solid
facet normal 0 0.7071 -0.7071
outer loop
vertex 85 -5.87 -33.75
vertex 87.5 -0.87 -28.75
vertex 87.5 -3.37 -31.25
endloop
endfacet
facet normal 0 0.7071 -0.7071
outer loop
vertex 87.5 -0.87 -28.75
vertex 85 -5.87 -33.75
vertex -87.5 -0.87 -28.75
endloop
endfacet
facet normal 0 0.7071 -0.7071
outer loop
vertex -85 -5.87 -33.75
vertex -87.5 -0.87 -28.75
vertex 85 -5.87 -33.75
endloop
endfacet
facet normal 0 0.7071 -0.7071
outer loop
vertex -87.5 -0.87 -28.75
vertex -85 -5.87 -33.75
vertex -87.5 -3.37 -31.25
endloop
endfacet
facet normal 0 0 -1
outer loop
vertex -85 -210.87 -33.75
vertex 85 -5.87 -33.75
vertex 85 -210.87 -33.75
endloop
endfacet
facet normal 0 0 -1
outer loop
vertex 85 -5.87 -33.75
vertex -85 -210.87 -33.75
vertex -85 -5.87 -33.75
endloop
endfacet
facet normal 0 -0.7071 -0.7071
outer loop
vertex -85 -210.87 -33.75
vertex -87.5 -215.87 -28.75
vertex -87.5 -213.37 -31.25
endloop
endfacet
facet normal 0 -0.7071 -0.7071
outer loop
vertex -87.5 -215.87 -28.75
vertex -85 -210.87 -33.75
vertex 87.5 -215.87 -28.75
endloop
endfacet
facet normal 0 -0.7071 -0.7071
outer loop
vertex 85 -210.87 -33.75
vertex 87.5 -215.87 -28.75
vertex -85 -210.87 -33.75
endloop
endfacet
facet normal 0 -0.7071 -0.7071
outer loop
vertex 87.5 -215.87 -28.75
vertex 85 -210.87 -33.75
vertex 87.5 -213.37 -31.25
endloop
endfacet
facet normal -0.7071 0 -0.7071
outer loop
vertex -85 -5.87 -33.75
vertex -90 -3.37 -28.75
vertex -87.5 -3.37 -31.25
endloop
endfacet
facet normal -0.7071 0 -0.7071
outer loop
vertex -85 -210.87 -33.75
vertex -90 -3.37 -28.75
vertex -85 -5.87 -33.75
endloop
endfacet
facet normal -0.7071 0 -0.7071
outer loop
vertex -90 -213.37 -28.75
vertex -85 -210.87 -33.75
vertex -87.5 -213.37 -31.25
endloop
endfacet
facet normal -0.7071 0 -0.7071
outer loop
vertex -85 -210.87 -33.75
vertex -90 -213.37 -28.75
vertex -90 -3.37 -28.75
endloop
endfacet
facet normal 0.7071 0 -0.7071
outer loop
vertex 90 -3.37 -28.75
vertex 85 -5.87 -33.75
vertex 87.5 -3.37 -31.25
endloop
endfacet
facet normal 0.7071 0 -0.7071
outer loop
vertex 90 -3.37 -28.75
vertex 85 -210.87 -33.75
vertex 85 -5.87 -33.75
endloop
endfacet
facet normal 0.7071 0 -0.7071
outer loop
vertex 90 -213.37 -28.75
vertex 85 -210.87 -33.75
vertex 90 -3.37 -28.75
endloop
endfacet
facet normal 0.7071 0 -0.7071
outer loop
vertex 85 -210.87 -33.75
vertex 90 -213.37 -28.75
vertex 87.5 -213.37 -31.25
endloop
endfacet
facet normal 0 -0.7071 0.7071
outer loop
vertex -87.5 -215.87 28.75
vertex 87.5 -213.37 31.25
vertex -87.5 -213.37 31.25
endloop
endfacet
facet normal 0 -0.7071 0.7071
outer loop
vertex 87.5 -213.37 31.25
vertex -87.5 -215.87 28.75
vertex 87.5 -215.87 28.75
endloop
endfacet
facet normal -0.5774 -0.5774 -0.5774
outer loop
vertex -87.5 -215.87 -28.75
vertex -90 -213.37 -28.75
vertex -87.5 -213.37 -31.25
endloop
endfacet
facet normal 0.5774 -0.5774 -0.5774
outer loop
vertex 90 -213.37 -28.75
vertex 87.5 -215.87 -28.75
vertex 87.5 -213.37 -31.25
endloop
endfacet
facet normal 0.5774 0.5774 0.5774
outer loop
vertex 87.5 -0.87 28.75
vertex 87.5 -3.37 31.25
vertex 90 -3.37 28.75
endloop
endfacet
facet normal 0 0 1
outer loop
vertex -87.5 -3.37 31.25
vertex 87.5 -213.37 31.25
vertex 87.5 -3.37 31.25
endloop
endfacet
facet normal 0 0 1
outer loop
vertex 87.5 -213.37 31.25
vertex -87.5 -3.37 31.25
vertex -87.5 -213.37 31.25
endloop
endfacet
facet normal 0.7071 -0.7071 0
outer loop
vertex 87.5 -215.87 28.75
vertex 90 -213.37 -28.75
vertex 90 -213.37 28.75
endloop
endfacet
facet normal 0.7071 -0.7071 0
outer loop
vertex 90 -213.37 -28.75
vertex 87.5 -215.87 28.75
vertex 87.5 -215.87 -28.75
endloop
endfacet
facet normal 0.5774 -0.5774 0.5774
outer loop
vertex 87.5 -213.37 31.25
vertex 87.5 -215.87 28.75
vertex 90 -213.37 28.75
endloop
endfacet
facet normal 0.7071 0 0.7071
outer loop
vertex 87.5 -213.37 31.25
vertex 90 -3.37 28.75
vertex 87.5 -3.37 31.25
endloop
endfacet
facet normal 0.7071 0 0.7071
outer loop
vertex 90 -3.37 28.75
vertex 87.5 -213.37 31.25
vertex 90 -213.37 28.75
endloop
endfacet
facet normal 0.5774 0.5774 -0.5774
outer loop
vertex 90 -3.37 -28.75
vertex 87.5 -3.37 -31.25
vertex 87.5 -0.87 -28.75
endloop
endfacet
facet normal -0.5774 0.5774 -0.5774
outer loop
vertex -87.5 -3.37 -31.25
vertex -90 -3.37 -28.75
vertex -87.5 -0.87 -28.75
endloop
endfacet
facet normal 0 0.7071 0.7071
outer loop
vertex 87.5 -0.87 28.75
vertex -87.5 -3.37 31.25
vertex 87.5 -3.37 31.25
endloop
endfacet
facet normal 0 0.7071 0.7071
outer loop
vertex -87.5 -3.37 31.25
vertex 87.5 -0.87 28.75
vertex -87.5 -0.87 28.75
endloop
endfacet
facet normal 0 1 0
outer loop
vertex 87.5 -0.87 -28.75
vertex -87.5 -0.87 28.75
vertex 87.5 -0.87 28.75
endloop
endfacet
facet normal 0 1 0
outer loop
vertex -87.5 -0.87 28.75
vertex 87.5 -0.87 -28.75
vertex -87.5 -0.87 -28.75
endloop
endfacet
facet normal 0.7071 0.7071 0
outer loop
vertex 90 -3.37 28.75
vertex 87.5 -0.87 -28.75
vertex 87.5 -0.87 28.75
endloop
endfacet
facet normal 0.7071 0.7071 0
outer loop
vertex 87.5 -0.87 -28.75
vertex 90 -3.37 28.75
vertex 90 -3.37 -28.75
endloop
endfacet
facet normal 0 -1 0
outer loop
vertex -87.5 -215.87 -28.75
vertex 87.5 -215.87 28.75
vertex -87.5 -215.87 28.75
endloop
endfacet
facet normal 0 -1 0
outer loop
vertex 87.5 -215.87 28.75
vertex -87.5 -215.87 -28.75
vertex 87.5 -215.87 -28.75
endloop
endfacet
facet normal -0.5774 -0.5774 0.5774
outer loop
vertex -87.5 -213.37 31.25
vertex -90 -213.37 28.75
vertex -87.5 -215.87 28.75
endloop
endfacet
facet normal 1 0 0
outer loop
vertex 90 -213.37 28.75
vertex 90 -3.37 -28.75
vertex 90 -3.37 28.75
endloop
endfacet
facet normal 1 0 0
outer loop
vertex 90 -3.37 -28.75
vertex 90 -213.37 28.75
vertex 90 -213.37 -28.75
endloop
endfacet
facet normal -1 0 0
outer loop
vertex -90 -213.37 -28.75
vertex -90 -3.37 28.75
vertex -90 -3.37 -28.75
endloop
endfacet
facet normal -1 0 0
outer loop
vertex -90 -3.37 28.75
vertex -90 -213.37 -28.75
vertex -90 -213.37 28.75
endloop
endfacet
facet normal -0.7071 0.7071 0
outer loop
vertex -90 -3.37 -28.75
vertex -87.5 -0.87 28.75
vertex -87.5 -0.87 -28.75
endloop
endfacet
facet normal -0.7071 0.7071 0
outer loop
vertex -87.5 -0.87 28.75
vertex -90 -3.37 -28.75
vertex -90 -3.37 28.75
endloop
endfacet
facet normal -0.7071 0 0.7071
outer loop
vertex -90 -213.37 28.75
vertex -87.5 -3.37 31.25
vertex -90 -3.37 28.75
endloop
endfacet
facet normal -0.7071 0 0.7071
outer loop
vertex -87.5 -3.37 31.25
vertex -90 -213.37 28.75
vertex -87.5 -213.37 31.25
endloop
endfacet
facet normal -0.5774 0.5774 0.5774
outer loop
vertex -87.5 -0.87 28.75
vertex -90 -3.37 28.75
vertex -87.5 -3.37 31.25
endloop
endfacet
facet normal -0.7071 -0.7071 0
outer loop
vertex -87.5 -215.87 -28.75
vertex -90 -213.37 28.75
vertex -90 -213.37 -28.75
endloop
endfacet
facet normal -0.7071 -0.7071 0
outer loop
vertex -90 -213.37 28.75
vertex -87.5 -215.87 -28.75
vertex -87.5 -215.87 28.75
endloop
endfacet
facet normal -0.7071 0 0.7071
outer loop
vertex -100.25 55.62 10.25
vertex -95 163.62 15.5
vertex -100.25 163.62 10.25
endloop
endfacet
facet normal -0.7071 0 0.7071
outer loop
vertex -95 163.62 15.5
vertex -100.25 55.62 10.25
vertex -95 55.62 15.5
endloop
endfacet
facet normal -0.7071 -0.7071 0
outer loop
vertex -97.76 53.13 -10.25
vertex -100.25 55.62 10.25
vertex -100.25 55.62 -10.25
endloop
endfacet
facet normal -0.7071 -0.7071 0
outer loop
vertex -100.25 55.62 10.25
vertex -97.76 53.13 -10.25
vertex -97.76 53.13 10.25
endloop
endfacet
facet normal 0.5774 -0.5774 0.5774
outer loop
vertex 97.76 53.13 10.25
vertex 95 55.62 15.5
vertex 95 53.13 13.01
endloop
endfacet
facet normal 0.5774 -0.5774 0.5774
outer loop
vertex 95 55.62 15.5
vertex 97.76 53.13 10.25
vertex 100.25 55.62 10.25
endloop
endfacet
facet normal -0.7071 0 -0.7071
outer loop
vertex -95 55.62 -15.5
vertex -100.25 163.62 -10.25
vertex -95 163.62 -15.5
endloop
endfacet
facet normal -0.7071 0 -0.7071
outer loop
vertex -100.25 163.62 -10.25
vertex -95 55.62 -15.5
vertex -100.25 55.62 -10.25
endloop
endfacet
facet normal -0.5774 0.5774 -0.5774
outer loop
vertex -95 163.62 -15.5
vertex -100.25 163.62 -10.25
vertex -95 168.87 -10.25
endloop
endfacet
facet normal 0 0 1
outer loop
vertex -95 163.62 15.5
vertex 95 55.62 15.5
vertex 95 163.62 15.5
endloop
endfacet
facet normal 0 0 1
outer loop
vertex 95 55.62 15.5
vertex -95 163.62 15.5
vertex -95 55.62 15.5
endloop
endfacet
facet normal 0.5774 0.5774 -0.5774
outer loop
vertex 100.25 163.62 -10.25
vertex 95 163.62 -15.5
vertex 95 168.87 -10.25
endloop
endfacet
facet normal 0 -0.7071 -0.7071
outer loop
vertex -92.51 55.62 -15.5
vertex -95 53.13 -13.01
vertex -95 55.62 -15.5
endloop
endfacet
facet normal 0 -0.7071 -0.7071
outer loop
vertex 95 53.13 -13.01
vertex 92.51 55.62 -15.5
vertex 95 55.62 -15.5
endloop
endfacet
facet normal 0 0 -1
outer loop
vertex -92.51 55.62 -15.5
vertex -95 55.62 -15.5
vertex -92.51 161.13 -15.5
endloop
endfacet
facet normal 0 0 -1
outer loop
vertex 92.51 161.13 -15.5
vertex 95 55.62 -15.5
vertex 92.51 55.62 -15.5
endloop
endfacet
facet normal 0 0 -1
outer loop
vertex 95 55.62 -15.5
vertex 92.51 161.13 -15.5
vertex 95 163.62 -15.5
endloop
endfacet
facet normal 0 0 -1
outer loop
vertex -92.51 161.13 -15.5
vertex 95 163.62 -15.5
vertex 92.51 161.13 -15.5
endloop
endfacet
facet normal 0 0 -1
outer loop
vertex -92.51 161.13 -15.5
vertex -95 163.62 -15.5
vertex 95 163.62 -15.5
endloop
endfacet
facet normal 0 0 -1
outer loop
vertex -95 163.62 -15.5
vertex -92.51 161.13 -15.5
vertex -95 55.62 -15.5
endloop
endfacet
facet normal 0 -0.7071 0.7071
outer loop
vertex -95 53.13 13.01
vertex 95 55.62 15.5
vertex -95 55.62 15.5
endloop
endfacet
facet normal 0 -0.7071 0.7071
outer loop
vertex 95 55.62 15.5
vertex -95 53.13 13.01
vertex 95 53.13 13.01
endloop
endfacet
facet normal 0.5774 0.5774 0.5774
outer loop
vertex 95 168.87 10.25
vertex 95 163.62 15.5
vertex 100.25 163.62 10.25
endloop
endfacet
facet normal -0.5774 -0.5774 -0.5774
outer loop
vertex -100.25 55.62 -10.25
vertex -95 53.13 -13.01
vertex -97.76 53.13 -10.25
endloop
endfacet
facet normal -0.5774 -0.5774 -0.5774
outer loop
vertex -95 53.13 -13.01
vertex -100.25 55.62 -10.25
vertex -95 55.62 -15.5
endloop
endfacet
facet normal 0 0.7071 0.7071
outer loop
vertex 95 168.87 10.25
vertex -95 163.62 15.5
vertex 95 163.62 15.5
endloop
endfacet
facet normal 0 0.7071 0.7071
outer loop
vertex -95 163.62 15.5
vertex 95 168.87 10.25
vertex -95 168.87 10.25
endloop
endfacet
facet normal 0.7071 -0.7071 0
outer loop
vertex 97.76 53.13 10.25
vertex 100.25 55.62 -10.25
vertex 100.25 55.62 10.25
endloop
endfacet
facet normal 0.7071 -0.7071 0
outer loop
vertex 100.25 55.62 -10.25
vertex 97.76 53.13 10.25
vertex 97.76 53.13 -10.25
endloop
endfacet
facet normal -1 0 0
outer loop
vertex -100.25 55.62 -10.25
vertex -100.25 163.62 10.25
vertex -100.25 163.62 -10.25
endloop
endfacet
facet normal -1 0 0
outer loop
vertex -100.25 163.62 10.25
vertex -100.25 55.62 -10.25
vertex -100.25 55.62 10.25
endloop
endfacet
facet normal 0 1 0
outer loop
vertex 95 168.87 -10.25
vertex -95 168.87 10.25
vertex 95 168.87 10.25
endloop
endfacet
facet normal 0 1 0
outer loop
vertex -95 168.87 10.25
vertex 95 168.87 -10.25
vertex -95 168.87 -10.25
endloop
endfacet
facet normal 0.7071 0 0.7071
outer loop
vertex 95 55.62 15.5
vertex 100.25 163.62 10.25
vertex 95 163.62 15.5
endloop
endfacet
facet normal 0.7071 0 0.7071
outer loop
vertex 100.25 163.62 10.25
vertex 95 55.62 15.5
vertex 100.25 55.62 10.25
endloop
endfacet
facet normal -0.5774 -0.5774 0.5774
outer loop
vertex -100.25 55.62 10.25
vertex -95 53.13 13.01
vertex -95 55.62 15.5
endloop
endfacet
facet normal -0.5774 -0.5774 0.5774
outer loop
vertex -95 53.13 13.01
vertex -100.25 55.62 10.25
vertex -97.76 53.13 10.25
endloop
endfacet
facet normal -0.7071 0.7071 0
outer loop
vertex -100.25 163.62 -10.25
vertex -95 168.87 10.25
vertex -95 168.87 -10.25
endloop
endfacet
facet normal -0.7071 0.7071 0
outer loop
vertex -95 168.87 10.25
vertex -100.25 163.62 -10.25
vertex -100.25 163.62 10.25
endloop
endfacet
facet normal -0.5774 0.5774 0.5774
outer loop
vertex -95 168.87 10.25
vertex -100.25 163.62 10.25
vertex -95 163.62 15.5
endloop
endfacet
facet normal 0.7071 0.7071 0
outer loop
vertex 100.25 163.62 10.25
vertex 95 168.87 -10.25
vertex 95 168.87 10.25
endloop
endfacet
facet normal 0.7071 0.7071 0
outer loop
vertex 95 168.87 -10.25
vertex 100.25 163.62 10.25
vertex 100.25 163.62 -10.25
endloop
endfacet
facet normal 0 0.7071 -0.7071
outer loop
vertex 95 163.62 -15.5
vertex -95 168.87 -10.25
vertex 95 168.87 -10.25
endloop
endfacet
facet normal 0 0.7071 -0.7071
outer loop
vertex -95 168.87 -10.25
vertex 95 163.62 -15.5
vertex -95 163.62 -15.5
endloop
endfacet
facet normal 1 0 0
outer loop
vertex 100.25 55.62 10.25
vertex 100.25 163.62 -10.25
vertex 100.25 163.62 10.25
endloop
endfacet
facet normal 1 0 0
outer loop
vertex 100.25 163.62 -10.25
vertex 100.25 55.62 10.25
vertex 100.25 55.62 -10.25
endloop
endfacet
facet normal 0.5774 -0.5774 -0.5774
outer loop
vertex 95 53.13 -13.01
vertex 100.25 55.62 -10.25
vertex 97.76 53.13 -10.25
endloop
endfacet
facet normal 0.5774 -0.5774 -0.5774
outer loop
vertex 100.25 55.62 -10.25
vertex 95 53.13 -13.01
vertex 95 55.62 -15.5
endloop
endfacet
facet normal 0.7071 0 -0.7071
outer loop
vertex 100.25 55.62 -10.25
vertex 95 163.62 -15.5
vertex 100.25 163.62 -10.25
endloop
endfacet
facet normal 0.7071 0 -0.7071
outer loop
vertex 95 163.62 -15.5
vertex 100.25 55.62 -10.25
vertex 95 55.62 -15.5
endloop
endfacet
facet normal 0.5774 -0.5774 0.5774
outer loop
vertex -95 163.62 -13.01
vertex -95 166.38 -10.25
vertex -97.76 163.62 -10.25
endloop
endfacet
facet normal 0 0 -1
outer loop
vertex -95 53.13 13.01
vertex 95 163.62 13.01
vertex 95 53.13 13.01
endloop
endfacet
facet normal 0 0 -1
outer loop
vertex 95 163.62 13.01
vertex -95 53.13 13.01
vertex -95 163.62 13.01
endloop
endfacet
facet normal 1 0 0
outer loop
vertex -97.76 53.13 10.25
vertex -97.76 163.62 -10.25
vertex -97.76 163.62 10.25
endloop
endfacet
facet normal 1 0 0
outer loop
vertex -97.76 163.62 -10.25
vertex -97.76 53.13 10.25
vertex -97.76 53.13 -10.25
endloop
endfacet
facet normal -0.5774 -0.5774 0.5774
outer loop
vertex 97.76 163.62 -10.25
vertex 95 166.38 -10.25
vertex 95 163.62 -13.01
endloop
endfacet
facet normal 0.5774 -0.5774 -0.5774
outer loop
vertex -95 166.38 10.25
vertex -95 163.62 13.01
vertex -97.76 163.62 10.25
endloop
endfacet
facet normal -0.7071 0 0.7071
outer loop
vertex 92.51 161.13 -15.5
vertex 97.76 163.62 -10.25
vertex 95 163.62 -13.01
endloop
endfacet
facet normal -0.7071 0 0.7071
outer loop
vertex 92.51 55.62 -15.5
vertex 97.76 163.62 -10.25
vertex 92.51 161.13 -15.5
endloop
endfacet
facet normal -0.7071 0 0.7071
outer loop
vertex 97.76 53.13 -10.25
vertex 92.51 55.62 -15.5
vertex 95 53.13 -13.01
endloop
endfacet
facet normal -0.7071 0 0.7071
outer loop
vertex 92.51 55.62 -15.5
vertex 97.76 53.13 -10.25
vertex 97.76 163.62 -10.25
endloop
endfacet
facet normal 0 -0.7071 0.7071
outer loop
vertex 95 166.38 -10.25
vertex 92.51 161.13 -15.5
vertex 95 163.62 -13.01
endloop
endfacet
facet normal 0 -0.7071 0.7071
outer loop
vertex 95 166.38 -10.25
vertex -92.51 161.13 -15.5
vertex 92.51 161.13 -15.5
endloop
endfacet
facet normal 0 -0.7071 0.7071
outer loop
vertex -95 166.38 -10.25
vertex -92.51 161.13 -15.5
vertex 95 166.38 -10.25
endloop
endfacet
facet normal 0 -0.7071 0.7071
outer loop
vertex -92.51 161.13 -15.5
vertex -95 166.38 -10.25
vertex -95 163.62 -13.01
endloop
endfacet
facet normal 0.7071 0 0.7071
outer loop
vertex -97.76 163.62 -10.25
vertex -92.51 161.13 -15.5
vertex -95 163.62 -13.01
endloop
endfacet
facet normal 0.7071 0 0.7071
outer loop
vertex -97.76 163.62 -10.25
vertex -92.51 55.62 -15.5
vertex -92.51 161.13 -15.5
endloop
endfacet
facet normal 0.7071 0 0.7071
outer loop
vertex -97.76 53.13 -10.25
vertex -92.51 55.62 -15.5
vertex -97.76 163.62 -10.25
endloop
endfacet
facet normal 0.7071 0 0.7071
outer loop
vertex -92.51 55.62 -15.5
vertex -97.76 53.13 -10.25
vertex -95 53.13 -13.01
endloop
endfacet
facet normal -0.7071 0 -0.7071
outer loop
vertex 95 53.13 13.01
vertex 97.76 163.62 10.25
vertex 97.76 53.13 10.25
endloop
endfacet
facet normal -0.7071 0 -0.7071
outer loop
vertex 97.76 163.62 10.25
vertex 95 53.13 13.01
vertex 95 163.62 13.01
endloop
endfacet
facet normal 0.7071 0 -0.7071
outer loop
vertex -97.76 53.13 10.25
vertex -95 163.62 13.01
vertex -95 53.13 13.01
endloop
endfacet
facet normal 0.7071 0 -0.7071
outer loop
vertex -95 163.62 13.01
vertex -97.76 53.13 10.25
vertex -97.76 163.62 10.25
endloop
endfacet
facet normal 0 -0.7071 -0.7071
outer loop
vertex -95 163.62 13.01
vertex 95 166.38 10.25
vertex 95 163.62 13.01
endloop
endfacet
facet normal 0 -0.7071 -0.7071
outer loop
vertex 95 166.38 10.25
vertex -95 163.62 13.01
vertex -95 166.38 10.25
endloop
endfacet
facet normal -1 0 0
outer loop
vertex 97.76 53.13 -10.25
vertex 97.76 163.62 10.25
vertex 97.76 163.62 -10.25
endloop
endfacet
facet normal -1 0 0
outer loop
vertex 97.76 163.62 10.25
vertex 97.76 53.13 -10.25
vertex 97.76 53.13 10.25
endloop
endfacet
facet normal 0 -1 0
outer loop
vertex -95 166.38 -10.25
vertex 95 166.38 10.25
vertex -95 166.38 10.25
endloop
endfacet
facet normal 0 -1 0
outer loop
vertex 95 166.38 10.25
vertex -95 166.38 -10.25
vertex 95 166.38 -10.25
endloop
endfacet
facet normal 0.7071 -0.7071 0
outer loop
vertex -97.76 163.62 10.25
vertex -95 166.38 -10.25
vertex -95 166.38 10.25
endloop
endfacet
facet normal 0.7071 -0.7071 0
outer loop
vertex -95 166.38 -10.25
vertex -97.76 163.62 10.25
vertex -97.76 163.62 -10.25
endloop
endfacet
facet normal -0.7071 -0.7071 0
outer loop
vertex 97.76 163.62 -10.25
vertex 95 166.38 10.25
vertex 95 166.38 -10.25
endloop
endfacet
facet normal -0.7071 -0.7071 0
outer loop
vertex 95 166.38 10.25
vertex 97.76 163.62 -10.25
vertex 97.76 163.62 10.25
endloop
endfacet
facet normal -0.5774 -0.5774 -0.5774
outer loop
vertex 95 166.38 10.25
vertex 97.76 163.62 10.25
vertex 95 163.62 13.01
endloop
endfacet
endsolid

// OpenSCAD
// file: sliding_chamfered_box.scad
/* Villano OpenSCAD 2021.1 */
Interior_Width=190; //[300]
Interior_Depth = 110; //[300]
Interior_Height=23; //[300]
Wall_Thickness=2.5; //[1:.5:30]
Clearance=.25; //[0:.05:1]

w=Interior_Width;
d=Interior_Depth;
h=Interior_Height;
twt=Wall_Thickness;
slop=Clearance;

module octahedron(r){
    scale(r) polyhedron(
        points=[
            [ 0,  0,  1],
            [ 1,  0,  0],
            [ 0,  1,  0],
            [-1,  0,  0],
            [ 0, -1,  0],
            [ 0,  0, -1],
        ],
        faces=[
            [0, 1, 2],
            [0, 2, 3],
            [0, 3, 4],
            [0, 4, 1],
            [5, 2, 1],
            [5, 3, 2],
            [5, 4, 3],
            [5, 1, 4],
        ]
    );
}

module drawer(w,d,h,solid=false) {
    difference(){
        union(){
            minkowski(){
                cube([w,d,h-twt],center=true);
                octahedron(twt);
            }
            translate([0,0,-twt]) intersection(){
                minkowski(){
                    cube([w-2*twt,d-2*twt,h-3*twt],center=true);
                    rotate([0,90,0])
                        cylinder(r=2*twt,h=2*twt,center=true,$fn=4);
                }
                minkowski(){
                    cube([w-2*twt,d-2*twt,h-3*twt],center=true);
                    rotate([90,0,0])
                        cylinder(r=2*twt,h=2*twt,center=true,$fn=4);
                }
            }
        }
        if (!solid) translate([0, 0, twt/2+.01])
            cube([w,d,h], center=true);
    }
}
module lid() translate([0,twt/2,0]) difference(){
    minkowski(){
        cube([w,d-twt+2*slop,h-twt], center=true);
        octahedron(2*twt+slop);
    }
    translate([0,-twt/2,0]) minkowski(){
        drawer(w,d+2*slop,h,solid=true);
        octahedron(slop+.01);
    }
}

translate([0,-d/2-twt,0]) drawer(w,d,h);
translate([0,d/2+twt,0]) lid();
// main file
/* Villano OpenSCAD 2021.1 */

use <sliding_chamfered_box.scad>

$fa = .01;
$fs = $preview ? 5 : 1;
//$fn=4;

Head=9;
Interior_Width=175; //[300]
Interior_Depth = 210; //[300]
Interior_Height=60; //[300]
Clearance=.2; //[0:.05:1]


Wall_Thickness=3.37;
w=Interior_Width;
d=Interior_Depth;
h=Interior_Height;
twt=Wall_Thickness;
slop=Clearance;

module carve(depth) minkowski(){
    children();
    rotate([180,0,0])
        cylinder(r=slop,h=depth);
}

module drawer2() difference(){
    
    drawer(w,d,h,twt);
    
    translate([0,0,-h/2+twt/2]) carve(4.5) {
        translate([0,152/2-4.5,0])
            rotate([0,90,0])
            cylinder(d=Head,h=(26.8-2)*2, center=true);//head
        rotate([90,0,0])
            cylinder(d=4,h=152,center=true);//stick
        cylinder(d=25,h=9,center=true); //thumb holes
    }
}

translate([0,-d/2-twt,0]) drawer(w,d,h,twt);
translate([0,d/2+twt,0]) lid(w,d,h,twt,slop);


/*intersection(){
    drawer2();
    cube([(26.8-2)*2+10,152+10,999],center=true);
}*/
